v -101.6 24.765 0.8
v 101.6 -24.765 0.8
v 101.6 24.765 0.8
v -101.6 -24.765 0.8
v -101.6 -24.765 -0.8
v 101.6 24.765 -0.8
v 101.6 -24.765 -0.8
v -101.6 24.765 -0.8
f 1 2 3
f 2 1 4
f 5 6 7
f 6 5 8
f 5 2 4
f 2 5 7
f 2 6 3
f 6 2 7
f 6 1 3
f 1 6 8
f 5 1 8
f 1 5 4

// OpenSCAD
$fn=64;

board_length = 203.2;
board_width  = 49.53;
board_thick  = 1.6;

module control_board(l=board_length, w=board_width, t=board_thick) {
    translate([-l/2, -w/2, -t/2])
        cube([l, w, t], center=false);
}

control_board();
